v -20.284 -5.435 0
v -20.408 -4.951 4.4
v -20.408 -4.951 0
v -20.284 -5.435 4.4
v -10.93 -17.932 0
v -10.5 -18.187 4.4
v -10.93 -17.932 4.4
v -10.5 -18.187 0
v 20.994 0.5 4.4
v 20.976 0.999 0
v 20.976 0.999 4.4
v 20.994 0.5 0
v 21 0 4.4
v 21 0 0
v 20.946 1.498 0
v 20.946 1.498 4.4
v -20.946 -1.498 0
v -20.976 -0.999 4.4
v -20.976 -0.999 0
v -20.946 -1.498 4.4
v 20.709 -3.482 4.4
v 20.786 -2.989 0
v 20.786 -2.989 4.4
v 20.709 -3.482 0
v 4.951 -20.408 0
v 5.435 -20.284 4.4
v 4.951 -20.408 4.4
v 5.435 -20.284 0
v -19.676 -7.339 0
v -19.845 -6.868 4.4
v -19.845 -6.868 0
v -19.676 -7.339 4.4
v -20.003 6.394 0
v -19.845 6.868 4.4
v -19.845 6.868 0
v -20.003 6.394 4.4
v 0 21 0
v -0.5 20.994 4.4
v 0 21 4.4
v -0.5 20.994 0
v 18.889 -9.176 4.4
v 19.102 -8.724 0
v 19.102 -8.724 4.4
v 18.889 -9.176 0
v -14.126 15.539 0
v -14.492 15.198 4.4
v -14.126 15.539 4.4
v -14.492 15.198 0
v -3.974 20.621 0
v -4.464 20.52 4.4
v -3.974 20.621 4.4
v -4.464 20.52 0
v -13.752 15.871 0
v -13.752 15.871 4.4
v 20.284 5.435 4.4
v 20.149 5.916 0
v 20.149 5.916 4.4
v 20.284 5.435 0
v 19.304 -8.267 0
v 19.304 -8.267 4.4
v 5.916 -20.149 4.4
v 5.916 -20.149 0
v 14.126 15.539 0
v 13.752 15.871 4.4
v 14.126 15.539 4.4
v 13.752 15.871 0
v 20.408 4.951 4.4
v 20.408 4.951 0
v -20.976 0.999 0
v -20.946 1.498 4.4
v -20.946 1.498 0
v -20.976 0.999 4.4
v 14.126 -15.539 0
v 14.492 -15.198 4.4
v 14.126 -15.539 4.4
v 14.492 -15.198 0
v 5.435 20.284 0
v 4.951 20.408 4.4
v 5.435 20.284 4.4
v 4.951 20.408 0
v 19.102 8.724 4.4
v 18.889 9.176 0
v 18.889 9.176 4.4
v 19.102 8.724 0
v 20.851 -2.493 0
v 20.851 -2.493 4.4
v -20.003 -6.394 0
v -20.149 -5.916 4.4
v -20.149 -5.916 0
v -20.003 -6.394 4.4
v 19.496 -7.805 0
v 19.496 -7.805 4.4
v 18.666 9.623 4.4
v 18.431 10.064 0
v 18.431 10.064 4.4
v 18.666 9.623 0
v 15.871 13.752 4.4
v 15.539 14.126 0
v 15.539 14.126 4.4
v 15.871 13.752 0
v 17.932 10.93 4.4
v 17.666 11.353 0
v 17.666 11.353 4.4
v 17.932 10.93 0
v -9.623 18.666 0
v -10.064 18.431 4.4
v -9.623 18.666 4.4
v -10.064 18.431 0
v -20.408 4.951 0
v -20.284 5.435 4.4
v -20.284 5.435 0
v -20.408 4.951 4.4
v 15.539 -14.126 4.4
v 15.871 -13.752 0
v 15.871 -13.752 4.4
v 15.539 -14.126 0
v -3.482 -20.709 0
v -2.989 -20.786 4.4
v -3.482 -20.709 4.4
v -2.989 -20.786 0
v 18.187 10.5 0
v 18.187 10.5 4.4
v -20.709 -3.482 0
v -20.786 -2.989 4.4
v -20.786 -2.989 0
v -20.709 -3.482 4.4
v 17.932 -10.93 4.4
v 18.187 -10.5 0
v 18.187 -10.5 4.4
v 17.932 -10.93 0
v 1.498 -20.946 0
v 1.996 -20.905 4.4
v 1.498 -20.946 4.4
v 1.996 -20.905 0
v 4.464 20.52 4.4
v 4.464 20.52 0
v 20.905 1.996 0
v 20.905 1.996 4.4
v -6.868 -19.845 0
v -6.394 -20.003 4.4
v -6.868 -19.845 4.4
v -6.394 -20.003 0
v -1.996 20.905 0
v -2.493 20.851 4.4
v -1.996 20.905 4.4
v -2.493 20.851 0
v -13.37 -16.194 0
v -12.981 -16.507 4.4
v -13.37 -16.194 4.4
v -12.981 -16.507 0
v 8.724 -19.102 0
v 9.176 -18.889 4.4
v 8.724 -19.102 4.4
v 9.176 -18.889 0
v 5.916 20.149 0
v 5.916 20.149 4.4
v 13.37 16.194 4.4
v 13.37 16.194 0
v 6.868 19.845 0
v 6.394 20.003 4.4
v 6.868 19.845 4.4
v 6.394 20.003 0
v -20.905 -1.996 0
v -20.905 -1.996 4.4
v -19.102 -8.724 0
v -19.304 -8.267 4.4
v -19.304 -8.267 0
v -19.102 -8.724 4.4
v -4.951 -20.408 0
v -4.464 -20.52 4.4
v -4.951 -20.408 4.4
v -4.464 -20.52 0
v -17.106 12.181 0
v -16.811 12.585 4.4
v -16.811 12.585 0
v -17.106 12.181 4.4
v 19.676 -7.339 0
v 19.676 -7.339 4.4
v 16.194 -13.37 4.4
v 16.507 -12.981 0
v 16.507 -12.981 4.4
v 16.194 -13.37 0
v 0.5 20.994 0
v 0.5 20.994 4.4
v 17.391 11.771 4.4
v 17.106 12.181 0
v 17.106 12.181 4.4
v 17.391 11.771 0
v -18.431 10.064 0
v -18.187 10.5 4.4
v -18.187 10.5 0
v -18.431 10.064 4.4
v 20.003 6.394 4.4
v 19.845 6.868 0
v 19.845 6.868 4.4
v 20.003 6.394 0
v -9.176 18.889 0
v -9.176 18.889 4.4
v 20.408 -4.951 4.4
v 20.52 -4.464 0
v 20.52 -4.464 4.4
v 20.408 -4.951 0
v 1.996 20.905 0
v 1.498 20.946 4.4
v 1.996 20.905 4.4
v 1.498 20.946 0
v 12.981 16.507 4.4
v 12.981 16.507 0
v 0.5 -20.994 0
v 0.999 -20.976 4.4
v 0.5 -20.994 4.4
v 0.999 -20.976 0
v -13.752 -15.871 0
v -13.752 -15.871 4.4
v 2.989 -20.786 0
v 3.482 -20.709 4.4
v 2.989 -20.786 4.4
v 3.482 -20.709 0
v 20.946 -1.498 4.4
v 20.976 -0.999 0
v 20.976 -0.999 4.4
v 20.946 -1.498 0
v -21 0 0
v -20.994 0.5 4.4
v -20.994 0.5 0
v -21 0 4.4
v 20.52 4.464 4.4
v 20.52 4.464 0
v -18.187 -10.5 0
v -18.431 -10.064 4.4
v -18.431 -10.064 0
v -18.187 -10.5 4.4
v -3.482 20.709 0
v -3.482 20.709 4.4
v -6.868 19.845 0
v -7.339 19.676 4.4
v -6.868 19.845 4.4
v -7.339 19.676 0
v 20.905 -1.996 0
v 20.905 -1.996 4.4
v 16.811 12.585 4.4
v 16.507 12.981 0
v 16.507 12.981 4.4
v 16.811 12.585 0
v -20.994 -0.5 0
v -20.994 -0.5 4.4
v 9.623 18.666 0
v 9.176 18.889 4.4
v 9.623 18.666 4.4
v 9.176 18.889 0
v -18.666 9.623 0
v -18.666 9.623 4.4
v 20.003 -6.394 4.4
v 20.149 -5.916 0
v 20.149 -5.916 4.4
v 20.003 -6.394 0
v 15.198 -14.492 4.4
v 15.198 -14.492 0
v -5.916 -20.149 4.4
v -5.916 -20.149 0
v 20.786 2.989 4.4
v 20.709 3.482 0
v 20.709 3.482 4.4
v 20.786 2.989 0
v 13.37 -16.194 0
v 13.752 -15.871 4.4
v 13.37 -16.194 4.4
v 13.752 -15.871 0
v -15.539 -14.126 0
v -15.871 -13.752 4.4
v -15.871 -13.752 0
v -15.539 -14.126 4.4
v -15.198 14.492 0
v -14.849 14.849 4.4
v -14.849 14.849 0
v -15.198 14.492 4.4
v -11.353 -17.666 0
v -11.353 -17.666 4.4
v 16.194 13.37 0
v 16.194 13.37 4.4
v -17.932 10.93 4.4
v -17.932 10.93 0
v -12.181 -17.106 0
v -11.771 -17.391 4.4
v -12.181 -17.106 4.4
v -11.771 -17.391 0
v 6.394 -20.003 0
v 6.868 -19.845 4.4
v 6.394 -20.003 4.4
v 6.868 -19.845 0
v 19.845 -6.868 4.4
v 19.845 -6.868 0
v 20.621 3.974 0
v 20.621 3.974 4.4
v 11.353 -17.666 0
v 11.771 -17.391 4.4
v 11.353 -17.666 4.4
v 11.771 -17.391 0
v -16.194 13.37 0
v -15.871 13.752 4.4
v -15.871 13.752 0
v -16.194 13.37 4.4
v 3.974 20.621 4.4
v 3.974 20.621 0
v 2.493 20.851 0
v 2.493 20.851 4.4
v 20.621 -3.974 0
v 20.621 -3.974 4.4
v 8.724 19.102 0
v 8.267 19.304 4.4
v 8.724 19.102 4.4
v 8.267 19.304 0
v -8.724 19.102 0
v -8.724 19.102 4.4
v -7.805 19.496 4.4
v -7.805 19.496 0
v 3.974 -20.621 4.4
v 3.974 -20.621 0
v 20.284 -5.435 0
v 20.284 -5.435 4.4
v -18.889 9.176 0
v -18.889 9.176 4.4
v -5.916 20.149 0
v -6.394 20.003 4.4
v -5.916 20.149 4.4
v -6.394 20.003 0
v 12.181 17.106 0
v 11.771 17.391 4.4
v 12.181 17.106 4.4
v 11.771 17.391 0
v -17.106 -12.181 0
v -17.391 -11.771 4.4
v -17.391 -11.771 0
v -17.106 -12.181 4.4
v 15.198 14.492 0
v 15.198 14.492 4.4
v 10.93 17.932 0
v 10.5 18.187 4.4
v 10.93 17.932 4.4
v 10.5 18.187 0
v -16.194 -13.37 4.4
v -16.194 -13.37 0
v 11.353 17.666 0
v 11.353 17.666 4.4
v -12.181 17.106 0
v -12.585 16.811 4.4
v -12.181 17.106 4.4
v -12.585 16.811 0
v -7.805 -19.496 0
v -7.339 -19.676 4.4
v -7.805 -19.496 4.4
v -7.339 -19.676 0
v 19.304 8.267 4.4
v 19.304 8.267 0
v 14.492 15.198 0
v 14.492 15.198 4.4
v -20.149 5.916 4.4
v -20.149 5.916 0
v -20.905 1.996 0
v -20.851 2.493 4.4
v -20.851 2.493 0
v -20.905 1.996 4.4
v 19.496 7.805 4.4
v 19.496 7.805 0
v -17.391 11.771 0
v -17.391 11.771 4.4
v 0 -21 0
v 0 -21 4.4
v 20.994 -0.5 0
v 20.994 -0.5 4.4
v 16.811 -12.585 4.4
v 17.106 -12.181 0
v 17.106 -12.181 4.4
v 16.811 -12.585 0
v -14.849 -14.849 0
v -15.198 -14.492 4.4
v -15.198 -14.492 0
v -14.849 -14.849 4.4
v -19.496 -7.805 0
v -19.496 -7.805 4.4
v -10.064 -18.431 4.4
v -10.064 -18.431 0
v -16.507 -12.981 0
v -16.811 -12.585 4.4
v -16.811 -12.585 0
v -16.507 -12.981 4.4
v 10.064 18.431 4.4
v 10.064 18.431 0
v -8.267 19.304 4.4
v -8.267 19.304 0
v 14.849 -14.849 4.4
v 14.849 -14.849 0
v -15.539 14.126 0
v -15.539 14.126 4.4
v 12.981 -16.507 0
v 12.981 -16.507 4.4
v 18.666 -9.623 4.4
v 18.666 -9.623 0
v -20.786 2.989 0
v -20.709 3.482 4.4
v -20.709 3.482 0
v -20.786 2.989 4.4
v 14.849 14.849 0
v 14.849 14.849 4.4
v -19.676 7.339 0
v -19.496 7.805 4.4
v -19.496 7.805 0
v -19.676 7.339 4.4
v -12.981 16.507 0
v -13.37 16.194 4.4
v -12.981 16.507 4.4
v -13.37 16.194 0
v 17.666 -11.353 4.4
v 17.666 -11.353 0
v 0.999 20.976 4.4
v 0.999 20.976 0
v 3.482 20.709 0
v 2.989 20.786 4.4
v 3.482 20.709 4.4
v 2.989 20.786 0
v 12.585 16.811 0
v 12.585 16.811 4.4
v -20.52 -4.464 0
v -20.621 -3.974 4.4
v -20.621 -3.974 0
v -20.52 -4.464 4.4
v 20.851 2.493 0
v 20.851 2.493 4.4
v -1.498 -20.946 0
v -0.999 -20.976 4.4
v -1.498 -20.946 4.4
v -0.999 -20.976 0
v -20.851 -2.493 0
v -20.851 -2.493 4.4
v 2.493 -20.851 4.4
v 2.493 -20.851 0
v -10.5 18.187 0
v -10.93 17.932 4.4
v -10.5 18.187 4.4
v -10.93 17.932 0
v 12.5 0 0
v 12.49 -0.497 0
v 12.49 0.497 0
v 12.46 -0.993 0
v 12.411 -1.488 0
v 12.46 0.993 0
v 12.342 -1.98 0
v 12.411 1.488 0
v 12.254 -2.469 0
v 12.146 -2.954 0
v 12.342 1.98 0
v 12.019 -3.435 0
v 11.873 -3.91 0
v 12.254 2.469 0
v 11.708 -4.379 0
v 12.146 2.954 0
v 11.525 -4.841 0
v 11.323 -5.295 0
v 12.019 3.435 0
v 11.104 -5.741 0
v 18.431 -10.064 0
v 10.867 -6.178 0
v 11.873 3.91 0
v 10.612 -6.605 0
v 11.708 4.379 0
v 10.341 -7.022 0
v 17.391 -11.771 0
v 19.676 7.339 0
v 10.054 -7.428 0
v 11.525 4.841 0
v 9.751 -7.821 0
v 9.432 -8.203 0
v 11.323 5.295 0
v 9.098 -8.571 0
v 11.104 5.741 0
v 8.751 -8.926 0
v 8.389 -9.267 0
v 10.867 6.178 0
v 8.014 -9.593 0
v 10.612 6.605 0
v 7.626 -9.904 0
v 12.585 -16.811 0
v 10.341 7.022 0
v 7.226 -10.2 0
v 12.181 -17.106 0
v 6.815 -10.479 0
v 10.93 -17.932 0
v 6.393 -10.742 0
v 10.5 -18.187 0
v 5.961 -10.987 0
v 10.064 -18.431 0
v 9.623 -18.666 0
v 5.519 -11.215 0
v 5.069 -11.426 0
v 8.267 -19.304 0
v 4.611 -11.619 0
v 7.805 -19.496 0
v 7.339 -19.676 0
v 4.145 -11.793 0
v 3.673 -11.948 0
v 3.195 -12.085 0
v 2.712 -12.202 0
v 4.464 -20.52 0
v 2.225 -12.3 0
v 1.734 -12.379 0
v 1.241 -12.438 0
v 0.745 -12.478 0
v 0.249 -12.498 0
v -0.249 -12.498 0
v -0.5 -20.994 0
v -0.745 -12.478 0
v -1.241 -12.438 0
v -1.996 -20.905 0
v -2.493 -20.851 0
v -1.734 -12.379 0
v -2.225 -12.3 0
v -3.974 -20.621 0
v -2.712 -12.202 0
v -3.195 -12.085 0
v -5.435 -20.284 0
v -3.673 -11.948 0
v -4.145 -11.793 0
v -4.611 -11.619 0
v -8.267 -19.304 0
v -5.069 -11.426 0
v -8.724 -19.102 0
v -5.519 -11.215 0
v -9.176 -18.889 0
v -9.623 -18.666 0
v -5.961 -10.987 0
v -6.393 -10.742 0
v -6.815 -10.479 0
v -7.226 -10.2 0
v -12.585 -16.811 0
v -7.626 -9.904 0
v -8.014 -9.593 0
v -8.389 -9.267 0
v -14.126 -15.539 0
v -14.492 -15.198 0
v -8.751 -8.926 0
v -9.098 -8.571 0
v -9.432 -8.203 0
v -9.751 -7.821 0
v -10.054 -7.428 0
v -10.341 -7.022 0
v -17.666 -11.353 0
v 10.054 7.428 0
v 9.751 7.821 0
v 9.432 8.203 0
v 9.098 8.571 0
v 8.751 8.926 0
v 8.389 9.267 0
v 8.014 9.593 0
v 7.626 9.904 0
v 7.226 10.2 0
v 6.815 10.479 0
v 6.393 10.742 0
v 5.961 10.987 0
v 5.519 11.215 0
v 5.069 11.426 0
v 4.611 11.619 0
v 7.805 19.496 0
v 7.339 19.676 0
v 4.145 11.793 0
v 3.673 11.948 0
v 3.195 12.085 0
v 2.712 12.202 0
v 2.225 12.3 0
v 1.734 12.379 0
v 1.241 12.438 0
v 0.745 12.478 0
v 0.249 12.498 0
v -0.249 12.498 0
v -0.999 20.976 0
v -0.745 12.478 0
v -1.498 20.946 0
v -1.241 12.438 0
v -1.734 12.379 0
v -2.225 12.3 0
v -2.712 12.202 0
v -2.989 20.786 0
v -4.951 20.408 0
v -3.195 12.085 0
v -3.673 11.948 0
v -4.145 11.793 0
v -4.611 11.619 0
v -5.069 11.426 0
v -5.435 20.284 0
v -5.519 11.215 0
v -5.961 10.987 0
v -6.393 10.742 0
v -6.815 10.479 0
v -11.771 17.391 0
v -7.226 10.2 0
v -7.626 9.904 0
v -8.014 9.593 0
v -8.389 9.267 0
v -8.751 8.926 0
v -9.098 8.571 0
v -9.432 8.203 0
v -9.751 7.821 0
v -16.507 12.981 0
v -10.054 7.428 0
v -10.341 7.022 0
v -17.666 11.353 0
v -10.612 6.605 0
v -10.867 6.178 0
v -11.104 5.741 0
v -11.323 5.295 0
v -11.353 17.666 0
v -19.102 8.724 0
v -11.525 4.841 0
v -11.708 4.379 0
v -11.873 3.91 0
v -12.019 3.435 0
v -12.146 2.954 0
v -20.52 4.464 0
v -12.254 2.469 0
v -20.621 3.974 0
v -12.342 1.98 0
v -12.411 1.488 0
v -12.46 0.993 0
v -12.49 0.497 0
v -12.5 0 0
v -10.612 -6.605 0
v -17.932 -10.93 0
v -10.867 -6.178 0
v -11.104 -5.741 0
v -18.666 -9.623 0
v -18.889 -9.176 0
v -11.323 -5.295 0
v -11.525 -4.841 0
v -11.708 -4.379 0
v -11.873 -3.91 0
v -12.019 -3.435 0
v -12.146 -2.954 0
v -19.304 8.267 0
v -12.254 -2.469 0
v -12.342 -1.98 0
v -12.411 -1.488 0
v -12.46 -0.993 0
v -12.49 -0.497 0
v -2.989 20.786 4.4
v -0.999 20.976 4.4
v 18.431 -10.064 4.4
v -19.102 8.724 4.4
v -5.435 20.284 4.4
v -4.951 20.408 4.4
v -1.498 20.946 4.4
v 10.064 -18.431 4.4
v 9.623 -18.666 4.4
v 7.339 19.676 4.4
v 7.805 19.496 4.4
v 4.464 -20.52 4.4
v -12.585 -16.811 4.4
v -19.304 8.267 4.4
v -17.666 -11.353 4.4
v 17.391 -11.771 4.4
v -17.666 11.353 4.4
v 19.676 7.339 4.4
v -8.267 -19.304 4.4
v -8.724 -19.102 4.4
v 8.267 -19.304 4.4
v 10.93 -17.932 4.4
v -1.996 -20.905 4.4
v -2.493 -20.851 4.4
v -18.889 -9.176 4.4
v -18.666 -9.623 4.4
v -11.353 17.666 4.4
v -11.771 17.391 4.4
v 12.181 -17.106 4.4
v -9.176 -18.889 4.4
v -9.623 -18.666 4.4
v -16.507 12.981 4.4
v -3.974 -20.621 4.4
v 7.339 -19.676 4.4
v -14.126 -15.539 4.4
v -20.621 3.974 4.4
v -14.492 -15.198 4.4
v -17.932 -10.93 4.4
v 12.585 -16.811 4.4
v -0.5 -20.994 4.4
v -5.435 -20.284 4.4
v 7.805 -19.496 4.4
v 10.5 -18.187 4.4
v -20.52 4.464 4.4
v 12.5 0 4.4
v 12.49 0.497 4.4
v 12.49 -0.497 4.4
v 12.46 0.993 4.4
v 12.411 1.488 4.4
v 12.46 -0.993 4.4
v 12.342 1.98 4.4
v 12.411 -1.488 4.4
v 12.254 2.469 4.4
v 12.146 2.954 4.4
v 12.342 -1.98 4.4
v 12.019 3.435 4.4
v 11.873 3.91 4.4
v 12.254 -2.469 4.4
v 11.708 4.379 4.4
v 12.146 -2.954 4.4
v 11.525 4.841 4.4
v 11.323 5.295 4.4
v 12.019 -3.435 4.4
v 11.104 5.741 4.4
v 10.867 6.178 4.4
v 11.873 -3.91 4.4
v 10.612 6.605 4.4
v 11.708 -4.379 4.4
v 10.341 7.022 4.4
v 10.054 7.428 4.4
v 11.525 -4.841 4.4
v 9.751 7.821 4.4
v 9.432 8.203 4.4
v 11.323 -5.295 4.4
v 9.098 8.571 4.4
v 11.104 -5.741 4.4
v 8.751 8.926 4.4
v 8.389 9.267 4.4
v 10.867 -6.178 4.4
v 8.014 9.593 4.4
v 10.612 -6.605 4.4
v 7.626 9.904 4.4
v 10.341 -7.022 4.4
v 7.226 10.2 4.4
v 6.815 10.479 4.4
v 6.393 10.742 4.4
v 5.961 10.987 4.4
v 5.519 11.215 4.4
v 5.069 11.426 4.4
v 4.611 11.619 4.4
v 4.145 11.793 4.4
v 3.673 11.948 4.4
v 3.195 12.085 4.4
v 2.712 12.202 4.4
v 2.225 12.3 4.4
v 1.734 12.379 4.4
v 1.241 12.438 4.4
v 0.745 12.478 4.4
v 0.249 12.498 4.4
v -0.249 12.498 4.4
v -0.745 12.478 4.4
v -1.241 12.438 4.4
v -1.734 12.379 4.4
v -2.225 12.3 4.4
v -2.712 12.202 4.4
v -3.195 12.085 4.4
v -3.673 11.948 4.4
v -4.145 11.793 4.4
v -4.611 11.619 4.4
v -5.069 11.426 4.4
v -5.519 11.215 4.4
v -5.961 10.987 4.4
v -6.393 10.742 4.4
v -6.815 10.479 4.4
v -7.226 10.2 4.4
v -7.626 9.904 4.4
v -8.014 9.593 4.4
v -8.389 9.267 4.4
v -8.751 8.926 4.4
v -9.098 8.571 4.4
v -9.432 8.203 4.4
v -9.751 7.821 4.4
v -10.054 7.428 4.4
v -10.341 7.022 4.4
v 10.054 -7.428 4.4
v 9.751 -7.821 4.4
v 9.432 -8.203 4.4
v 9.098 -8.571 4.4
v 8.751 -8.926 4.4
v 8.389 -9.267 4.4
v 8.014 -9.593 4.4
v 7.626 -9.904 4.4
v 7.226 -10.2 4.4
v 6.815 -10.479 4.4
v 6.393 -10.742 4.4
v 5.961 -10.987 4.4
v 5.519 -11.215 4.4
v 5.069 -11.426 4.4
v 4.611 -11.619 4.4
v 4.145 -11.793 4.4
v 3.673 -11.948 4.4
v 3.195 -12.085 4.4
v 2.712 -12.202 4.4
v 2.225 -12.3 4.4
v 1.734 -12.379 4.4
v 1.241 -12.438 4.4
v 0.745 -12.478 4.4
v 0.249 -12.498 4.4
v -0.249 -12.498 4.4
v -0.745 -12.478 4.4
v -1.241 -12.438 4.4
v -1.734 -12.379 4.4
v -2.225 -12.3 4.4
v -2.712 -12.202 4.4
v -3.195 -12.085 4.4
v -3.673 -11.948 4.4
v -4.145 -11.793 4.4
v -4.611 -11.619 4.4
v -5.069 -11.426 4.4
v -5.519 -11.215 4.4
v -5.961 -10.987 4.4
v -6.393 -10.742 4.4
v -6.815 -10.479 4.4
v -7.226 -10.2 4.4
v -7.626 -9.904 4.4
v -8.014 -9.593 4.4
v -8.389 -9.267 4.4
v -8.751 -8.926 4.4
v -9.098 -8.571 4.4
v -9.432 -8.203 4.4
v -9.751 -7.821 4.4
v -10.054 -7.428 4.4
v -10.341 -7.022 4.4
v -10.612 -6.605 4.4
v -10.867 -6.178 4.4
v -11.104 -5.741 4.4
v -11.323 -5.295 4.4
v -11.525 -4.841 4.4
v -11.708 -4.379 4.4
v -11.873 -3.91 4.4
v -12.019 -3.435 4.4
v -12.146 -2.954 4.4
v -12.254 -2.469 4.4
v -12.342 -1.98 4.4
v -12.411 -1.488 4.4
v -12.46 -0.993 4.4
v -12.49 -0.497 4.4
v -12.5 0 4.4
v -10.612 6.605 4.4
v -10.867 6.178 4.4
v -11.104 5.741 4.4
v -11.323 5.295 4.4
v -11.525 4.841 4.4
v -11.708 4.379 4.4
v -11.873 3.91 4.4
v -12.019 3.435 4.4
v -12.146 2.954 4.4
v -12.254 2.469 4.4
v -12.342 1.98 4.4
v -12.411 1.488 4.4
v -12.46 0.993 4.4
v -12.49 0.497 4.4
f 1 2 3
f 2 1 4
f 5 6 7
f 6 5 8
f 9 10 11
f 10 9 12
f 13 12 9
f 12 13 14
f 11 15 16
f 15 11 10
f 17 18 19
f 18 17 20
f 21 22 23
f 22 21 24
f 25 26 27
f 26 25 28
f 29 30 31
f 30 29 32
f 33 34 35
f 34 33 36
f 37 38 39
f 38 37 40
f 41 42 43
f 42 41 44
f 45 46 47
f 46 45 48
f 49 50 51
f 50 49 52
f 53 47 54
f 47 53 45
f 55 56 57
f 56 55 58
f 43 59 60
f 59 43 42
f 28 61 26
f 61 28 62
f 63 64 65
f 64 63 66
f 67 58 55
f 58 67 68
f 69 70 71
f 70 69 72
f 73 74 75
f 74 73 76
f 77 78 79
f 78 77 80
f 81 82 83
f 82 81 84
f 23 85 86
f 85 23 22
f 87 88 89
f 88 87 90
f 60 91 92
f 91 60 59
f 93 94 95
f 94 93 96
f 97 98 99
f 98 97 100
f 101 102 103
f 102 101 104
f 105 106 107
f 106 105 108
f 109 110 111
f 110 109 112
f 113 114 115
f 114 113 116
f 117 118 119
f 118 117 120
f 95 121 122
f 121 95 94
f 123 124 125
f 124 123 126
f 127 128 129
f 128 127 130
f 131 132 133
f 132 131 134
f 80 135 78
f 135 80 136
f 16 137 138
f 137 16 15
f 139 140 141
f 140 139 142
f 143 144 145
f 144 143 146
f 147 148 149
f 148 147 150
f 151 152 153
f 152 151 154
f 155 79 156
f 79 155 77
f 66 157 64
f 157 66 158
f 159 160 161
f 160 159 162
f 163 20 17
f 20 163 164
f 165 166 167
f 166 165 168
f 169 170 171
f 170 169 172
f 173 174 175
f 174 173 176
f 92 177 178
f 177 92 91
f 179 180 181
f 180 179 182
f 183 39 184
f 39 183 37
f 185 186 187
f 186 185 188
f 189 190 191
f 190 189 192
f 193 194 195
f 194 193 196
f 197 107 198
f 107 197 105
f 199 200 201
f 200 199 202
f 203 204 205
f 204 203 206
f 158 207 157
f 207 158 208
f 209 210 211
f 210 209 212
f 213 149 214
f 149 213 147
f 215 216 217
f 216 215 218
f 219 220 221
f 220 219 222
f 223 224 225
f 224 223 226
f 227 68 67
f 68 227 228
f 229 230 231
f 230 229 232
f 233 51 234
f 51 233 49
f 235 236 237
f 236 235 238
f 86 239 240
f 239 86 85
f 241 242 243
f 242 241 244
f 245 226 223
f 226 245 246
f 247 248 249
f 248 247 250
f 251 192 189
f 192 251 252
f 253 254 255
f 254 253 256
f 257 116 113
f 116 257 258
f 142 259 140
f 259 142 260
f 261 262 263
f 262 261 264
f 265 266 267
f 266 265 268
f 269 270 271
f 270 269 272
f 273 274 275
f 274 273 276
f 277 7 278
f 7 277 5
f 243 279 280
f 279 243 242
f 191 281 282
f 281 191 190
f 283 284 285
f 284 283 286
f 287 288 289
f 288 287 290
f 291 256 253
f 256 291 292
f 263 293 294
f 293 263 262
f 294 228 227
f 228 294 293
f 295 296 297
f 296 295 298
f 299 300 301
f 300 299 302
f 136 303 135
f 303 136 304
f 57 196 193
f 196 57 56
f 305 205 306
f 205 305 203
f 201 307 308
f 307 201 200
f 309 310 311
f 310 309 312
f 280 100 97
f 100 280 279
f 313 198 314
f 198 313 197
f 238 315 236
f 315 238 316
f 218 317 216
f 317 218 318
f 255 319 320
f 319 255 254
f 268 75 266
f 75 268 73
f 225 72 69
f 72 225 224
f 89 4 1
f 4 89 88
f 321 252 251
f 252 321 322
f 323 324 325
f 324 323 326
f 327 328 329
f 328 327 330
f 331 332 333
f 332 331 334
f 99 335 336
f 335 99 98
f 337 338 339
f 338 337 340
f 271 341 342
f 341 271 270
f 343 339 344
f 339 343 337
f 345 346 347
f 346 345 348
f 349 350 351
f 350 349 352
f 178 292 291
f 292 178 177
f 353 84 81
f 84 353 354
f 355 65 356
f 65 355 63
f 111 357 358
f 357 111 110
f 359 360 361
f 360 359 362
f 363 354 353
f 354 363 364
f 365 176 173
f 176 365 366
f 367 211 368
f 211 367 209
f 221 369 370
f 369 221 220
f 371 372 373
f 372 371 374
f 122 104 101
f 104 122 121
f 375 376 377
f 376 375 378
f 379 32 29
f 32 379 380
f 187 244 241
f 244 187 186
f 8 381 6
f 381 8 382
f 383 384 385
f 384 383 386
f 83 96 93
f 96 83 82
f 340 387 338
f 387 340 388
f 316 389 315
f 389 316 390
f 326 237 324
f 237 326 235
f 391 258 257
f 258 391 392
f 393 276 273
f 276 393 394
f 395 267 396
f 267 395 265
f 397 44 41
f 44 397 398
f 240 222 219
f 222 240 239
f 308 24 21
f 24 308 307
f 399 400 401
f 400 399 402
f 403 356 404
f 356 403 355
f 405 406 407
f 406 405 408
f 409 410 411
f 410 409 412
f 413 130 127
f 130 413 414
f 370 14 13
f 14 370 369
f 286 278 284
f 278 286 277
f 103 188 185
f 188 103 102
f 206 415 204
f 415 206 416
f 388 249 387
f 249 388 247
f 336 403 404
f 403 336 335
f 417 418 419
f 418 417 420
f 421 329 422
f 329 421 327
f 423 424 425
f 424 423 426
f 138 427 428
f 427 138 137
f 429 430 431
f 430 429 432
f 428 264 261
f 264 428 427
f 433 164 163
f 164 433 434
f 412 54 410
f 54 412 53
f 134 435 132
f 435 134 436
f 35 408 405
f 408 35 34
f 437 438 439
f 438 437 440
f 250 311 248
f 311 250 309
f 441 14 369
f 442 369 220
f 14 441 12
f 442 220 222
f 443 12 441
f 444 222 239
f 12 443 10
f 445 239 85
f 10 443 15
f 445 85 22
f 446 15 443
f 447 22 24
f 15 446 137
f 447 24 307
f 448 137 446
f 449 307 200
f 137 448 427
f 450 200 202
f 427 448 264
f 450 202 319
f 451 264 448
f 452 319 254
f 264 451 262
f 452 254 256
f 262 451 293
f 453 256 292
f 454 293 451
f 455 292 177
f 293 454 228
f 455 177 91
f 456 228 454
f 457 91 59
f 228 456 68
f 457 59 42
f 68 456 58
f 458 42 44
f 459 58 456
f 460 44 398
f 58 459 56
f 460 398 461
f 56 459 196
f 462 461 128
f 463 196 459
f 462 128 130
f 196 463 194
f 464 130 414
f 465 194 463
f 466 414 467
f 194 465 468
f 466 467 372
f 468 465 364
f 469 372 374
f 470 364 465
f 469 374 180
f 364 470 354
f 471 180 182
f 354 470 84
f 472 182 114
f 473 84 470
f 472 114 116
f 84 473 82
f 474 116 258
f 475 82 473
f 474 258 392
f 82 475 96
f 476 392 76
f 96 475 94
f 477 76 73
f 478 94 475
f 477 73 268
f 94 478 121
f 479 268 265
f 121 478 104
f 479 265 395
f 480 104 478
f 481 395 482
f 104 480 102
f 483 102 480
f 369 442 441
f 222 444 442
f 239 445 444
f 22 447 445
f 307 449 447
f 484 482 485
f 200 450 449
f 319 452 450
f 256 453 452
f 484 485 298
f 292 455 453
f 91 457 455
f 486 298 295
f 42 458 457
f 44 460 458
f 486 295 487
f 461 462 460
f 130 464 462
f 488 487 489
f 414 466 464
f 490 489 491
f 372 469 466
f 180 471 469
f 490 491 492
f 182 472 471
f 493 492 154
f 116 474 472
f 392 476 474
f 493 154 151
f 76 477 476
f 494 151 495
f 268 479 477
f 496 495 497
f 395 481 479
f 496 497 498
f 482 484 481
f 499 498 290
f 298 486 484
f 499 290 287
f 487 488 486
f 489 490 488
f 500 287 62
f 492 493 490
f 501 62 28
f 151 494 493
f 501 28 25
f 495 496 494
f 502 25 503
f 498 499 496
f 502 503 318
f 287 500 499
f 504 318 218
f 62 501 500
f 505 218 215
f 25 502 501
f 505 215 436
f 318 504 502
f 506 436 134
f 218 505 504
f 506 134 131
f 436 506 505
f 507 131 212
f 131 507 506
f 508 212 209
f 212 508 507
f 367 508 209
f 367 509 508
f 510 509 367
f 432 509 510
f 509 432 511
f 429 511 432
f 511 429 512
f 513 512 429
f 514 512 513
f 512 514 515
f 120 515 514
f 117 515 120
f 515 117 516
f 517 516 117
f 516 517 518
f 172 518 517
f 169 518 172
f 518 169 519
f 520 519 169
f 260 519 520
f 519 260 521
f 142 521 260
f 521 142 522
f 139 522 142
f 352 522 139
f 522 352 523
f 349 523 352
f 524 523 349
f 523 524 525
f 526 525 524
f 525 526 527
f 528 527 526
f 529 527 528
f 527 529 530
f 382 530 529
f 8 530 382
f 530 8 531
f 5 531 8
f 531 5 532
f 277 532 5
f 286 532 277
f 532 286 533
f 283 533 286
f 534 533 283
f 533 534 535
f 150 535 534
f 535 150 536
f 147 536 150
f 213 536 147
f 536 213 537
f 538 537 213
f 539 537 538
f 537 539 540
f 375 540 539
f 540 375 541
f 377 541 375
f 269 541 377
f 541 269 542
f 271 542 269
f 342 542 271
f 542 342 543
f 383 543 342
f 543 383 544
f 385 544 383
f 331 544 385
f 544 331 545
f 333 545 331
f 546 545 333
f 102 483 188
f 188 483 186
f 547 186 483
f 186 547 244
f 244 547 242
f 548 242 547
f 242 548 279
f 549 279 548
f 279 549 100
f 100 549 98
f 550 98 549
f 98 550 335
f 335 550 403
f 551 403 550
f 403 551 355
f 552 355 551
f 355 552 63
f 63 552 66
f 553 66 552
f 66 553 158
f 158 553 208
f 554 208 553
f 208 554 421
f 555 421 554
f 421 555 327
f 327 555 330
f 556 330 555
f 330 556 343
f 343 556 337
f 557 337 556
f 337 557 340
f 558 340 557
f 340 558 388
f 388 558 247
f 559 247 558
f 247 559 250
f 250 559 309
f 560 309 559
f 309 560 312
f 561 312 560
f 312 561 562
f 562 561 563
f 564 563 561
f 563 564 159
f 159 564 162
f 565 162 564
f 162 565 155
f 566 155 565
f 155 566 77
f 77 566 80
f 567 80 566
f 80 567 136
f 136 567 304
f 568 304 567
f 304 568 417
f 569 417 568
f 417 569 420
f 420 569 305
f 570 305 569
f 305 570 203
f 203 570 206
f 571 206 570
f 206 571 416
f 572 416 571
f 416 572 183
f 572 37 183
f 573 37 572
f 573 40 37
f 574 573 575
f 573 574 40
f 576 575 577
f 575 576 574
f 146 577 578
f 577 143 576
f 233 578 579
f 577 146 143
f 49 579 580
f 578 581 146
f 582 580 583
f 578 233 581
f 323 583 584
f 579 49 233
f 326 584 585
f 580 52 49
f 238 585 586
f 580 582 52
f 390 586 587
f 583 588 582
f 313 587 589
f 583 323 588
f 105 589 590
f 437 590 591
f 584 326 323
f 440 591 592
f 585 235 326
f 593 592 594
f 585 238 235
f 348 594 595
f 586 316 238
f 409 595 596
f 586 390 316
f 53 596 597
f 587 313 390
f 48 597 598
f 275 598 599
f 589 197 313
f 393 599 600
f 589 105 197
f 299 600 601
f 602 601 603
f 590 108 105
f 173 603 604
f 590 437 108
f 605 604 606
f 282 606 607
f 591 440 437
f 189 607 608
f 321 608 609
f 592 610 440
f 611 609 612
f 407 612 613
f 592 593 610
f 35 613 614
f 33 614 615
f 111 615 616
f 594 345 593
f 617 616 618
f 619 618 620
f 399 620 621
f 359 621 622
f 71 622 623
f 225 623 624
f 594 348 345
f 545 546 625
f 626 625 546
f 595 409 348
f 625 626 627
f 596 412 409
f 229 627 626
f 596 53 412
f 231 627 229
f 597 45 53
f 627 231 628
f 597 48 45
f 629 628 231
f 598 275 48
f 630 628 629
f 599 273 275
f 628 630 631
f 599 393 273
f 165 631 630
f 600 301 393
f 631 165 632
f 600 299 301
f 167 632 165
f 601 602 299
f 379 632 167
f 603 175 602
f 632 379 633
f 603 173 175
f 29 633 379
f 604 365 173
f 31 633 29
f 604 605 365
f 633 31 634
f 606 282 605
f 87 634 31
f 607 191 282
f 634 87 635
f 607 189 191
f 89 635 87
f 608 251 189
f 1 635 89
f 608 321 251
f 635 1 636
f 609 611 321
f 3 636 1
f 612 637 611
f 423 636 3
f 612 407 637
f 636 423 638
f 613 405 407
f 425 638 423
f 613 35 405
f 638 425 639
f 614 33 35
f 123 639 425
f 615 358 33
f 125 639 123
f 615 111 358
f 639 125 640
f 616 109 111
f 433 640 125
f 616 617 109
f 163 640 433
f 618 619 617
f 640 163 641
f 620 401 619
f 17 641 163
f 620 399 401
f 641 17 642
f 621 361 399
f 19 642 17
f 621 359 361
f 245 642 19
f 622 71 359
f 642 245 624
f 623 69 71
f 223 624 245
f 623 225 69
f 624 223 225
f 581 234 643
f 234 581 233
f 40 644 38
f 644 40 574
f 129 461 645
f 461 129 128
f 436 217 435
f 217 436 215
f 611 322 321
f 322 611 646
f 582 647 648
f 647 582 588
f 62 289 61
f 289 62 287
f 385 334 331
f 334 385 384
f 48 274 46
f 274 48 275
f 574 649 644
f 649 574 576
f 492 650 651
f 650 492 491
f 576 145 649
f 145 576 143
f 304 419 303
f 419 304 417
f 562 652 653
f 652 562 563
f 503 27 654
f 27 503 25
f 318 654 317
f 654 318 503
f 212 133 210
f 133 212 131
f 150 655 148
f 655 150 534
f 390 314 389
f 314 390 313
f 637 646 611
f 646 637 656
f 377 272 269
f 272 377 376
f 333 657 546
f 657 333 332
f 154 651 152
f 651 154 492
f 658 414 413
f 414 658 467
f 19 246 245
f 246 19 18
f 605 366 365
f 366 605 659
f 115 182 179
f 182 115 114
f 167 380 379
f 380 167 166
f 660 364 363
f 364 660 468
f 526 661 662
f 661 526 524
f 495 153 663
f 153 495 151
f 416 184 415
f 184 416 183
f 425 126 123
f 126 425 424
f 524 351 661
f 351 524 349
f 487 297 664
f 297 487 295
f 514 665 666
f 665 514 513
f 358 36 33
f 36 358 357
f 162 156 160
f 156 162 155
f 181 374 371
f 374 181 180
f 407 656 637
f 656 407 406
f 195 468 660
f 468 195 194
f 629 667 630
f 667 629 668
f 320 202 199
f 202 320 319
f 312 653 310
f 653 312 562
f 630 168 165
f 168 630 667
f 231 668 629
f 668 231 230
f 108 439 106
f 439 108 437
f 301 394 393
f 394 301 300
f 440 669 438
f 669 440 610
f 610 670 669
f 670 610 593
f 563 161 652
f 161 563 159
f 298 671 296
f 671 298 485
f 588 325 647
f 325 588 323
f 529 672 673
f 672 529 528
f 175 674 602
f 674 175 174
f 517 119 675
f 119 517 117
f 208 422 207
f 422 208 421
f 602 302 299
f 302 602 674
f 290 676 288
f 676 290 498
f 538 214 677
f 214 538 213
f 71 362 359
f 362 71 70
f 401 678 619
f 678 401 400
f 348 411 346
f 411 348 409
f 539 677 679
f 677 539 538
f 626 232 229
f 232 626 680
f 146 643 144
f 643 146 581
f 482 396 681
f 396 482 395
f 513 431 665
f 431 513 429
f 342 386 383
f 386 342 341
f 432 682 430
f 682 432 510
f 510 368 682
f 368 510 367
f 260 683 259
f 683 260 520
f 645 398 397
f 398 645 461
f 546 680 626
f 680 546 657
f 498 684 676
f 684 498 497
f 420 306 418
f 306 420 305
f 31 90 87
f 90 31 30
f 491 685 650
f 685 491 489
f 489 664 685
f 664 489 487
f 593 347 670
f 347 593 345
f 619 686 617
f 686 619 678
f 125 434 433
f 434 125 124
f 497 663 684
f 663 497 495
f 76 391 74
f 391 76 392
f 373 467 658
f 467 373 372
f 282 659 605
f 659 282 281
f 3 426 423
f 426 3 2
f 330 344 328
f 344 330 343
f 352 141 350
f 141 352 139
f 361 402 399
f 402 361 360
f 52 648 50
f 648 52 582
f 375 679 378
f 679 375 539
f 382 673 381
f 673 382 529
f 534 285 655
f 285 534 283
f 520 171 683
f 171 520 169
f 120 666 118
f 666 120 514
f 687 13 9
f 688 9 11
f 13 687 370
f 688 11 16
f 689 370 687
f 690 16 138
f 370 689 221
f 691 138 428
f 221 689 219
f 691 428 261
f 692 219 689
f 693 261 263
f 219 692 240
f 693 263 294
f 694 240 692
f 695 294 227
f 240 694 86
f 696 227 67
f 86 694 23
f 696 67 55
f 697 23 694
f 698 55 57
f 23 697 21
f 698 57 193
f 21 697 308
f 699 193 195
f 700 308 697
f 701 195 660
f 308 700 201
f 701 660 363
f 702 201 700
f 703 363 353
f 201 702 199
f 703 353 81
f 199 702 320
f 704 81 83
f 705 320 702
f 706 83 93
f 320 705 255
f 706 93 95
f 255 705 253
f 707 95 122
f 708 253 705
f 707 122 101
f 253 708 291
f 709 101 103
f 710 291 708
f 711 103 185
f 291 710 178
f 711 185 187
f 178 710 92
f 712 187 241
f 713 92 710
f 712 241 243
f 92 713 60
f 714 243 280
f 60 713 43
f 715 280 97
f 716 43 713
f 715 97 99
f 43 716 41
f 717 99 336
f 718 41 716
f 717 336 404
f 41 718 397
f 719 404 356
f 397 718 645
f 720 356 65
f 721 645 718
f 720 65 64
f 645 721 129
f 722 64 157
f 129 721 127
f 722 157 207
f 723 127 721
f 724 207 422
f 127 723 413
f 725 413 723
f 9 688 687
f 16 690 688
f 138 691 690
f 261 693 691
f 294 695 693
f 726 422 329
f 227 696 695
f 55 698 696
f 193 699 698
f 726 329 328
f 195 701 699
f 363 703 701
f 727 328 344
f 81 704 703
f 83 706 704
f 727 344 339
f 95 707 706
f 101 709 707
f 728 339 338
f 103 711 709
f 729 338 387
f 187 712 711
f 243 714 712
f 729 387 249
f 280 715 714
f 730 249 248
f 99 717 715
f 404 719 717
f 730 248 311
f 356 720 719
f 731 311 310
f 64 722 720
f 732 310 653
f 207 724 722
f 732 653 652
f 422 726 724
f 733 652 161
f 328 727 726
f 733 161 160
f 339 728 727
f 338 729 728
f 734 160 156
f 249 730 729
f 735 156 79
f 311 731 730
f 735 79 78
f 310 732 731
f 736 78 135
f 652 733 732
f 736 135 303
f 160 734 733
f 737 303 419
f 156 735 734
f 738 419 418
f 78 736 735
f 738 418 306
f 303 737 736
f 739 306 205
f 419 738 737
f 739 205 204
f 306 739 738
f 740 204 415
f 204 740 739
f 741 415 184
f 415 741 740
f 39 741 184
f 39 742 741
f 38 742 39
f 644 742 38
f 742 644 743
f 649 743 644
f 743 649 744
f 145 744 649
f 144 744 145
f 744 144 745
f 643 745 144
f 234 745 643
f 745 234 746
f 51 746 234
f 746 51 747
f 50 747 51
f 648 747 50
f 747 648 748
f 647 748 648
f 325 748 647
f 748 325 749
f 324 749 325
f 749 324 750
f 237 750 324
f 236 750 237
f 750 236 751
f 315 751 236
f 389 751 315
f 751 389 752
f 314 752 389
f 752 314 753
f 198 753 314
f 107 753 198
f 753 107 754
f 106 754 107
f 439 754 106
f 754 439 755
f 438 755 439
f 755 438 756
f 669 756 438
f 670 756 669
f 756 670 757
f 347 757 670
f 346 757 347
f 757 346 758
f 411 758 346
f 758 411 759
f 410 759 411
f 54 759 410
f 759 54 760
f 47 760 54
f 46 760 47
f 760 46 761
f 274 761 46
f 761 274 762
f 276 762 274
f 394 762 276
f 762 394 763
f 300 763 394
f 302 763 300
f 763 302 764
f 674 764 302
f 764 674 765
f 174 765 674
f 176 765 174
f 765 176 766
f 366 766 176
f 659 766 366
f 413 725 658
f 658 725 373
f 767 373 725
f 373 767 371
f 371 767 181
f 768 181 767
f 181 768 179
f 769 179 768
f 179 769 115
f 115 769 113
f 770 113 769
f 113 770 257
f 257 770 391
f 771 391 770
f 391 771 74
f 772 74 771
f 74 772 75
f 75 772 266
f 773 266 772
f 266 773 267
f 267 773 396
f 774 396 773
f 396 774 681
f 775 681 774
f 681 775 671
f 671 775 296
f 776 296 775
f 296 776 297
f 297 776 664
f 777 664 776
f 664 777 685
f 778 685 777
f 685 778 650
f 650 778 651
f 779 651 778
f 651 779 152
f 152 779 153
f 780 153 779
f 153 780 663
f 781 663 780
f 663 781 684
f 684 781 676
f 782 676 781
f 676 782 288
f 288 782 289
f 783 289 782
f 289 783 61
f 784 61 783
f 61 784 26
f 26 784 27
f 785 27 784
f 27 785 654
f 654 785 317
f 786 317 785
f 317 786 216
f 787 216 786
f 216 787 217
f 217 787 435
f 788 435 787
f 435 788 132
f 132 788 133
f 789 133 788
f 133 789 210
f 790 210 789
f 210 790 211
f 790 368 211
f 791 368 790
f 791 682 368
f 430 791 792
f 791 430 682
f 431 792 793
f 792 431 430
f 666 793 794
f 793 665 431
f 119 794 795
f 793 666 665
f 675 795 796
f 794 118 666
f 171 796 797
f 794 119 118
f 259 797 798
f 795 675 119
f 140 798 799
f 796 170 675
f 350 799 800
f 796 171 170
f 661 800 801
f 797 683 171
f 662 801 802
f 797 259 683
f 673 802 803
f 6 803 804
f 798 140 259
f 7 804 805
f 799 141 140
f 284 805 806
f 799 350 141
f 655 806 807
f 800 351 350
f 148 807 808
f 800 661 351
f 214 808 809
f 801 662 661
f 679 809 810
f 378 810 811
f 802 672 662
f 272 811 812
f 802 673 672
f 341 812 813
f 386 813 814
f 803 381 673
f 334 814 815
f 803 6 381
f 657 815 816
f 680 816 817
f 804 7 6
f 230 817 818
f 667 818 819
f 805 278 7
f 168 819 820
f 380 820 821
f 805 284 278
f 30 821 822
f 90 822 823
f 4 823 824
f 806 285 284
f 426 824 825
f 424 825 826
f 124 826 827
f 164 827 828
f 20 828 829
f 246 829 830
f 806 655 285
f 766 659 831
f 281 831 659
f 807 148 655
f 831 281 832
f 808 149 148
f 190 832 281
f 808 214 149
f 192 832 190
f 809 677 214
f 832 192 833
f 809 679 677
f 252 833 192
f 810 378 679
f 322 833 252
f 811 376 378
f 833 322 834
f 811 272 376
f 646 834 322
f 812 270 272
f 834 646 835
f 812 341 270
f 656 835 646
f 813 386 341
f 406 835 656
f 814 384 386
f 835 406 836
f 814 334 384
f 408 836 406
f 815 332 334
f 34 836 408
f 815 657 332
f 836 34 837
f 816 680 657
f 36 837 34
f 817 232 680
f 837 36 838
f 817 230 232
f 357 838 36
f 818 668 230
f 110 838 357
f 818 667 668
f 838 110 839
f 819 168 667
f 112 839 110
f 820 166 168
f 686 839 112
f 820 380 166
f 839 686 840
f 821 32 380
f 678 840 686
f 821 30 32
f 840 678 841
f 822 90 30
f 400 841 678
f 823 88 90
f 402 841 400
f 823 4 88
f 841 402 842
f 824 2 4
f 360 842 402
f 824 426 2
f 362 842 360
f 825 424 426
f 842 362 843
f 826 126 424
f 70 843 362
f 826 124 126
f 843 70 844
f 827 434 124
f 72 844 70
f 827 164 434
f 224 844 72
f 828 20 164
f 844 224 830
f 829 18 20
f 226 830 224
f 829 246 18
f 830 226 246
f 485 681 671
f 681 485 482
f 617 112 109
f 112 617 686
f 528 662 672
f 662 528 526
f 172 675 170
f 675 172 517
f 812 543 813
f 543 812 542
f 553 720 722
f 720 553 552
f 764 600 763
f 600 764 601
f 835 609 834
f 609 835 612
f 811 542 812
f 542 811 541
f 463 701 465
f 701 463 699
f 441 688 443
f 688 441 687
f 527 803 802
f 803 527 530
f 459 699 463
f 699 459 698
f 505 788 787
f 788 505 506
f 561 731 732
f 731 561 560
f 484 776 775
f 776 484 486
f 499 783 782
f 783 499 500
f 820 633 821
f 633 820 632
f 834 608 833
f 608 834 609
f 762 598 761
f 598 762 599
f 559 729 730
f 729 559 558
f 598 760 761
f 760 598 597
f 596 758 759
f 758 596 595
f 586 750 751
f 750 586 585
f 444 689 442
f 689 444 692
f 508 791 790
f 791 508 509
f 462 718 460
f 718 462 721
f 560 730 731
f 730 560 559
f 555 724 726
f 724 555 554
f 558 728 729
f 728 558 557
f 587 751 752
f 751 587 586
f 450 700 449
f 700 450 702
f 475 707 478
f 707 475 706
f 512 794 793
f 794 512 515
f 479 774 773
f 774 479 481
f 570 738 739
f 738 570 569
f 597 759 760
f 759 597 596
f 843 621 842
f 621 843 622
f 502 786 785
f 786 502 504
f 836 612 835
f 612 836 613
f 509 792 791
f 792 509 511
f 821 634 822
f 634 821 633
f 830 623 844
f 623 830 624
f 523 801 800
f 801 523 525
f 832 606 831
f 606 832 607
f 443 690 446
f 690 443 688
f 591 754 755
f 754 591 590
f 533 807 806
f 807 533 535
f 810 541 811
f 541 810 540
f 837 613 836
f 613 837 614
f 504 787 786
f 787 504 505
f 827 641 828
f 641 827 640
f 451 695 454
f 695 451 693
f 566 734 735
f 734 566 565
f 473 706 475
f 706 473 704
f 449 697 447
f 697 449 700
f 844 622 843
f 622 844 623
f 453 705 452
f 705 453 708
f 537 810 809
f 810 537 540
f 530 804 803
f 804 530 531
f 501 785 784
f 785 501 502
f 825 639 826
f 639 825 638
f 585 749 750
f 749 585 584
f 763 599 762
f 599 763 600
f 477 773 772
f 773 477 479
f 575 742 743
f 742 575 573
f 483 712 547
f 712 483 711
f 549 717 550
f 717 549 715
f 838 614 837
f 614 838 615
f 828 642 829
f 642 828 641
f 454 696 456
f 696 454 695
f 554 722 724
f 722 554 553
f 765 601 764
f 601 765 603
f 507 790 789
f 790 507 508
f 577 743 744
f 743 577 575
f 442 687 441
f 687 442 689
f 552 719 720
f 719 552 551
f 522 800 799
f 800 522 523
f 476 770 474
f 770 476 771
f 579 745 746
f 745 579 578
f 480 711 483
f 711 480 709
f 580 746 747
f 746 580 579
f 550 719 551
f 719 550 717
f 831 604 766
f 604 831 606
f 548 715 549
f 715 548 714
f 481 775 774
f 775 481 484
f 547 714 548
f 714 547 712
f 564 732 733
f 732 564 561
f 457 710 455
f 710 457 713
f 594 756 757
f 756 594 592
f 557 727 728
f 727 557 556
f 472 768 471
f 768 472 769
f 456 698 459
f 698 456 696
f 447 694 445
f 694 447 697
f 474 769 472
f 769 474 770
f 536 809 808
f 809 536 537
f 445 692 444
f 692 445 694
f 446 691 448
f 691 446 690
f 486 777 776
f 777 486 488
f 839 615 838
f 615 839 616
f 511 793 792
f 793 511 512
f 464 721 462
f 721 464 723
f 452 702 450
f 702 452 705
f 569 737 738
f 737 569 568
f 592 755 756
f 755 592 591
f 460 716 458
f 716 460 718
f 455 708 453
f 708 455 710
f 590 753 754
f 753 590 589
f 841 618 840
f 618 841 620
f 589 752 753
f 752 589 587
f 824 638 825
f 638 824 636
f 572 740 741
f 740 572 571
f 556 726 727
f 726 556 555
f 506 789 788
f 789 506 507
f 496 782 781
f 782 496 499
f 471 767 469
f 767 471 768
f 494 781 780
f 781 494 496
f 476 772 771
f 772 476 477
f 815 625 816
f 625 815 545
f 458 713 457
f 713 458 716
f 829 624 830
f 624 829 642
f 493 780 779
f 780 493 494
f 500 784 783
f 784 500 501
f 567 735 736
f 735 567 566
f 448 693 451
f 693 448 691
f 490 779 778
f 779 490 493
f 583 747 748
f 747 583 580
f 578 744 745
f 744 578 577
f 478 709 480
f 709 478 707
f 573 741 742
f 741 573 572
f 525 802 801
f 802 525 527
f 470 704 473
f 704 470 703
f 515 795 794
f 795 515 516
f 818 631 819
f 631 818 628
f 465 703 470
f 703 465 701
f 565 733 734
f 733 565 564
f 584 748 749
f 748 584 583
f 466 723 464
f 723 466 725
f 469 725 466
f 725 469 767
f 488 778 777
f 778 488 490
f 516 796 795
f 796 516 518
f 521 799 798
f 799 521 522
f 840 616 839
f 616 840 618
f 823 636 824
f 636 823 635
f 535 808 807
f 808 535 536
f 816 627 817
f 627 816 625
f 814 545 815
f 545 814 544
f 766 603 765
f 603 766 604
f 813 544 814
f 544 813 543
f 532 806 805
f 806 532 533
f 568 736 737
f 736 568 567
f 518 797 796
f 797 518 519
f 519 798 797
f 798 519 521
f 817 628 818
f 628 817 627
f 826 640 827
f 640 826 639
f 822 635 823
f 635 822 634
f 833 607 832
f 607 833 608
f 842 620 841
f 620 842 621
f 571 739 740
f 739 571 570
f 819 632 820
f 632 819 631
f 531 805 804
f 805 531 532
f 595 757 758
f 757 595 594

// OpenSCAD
$fa=0.5; // default minimum facet angle is now 0.5
$fs=0.5; // default minimum facet size is now 0.5 mm

inner_diameter = 25;
outer_diameter = 42;
thickness = 4.4;

difference() {
    cylinder(d=outer_diameter, h=thickness);
    translate([0,0,-1]) cylinder(d=inner_diameter, h=thickness+2);
}
